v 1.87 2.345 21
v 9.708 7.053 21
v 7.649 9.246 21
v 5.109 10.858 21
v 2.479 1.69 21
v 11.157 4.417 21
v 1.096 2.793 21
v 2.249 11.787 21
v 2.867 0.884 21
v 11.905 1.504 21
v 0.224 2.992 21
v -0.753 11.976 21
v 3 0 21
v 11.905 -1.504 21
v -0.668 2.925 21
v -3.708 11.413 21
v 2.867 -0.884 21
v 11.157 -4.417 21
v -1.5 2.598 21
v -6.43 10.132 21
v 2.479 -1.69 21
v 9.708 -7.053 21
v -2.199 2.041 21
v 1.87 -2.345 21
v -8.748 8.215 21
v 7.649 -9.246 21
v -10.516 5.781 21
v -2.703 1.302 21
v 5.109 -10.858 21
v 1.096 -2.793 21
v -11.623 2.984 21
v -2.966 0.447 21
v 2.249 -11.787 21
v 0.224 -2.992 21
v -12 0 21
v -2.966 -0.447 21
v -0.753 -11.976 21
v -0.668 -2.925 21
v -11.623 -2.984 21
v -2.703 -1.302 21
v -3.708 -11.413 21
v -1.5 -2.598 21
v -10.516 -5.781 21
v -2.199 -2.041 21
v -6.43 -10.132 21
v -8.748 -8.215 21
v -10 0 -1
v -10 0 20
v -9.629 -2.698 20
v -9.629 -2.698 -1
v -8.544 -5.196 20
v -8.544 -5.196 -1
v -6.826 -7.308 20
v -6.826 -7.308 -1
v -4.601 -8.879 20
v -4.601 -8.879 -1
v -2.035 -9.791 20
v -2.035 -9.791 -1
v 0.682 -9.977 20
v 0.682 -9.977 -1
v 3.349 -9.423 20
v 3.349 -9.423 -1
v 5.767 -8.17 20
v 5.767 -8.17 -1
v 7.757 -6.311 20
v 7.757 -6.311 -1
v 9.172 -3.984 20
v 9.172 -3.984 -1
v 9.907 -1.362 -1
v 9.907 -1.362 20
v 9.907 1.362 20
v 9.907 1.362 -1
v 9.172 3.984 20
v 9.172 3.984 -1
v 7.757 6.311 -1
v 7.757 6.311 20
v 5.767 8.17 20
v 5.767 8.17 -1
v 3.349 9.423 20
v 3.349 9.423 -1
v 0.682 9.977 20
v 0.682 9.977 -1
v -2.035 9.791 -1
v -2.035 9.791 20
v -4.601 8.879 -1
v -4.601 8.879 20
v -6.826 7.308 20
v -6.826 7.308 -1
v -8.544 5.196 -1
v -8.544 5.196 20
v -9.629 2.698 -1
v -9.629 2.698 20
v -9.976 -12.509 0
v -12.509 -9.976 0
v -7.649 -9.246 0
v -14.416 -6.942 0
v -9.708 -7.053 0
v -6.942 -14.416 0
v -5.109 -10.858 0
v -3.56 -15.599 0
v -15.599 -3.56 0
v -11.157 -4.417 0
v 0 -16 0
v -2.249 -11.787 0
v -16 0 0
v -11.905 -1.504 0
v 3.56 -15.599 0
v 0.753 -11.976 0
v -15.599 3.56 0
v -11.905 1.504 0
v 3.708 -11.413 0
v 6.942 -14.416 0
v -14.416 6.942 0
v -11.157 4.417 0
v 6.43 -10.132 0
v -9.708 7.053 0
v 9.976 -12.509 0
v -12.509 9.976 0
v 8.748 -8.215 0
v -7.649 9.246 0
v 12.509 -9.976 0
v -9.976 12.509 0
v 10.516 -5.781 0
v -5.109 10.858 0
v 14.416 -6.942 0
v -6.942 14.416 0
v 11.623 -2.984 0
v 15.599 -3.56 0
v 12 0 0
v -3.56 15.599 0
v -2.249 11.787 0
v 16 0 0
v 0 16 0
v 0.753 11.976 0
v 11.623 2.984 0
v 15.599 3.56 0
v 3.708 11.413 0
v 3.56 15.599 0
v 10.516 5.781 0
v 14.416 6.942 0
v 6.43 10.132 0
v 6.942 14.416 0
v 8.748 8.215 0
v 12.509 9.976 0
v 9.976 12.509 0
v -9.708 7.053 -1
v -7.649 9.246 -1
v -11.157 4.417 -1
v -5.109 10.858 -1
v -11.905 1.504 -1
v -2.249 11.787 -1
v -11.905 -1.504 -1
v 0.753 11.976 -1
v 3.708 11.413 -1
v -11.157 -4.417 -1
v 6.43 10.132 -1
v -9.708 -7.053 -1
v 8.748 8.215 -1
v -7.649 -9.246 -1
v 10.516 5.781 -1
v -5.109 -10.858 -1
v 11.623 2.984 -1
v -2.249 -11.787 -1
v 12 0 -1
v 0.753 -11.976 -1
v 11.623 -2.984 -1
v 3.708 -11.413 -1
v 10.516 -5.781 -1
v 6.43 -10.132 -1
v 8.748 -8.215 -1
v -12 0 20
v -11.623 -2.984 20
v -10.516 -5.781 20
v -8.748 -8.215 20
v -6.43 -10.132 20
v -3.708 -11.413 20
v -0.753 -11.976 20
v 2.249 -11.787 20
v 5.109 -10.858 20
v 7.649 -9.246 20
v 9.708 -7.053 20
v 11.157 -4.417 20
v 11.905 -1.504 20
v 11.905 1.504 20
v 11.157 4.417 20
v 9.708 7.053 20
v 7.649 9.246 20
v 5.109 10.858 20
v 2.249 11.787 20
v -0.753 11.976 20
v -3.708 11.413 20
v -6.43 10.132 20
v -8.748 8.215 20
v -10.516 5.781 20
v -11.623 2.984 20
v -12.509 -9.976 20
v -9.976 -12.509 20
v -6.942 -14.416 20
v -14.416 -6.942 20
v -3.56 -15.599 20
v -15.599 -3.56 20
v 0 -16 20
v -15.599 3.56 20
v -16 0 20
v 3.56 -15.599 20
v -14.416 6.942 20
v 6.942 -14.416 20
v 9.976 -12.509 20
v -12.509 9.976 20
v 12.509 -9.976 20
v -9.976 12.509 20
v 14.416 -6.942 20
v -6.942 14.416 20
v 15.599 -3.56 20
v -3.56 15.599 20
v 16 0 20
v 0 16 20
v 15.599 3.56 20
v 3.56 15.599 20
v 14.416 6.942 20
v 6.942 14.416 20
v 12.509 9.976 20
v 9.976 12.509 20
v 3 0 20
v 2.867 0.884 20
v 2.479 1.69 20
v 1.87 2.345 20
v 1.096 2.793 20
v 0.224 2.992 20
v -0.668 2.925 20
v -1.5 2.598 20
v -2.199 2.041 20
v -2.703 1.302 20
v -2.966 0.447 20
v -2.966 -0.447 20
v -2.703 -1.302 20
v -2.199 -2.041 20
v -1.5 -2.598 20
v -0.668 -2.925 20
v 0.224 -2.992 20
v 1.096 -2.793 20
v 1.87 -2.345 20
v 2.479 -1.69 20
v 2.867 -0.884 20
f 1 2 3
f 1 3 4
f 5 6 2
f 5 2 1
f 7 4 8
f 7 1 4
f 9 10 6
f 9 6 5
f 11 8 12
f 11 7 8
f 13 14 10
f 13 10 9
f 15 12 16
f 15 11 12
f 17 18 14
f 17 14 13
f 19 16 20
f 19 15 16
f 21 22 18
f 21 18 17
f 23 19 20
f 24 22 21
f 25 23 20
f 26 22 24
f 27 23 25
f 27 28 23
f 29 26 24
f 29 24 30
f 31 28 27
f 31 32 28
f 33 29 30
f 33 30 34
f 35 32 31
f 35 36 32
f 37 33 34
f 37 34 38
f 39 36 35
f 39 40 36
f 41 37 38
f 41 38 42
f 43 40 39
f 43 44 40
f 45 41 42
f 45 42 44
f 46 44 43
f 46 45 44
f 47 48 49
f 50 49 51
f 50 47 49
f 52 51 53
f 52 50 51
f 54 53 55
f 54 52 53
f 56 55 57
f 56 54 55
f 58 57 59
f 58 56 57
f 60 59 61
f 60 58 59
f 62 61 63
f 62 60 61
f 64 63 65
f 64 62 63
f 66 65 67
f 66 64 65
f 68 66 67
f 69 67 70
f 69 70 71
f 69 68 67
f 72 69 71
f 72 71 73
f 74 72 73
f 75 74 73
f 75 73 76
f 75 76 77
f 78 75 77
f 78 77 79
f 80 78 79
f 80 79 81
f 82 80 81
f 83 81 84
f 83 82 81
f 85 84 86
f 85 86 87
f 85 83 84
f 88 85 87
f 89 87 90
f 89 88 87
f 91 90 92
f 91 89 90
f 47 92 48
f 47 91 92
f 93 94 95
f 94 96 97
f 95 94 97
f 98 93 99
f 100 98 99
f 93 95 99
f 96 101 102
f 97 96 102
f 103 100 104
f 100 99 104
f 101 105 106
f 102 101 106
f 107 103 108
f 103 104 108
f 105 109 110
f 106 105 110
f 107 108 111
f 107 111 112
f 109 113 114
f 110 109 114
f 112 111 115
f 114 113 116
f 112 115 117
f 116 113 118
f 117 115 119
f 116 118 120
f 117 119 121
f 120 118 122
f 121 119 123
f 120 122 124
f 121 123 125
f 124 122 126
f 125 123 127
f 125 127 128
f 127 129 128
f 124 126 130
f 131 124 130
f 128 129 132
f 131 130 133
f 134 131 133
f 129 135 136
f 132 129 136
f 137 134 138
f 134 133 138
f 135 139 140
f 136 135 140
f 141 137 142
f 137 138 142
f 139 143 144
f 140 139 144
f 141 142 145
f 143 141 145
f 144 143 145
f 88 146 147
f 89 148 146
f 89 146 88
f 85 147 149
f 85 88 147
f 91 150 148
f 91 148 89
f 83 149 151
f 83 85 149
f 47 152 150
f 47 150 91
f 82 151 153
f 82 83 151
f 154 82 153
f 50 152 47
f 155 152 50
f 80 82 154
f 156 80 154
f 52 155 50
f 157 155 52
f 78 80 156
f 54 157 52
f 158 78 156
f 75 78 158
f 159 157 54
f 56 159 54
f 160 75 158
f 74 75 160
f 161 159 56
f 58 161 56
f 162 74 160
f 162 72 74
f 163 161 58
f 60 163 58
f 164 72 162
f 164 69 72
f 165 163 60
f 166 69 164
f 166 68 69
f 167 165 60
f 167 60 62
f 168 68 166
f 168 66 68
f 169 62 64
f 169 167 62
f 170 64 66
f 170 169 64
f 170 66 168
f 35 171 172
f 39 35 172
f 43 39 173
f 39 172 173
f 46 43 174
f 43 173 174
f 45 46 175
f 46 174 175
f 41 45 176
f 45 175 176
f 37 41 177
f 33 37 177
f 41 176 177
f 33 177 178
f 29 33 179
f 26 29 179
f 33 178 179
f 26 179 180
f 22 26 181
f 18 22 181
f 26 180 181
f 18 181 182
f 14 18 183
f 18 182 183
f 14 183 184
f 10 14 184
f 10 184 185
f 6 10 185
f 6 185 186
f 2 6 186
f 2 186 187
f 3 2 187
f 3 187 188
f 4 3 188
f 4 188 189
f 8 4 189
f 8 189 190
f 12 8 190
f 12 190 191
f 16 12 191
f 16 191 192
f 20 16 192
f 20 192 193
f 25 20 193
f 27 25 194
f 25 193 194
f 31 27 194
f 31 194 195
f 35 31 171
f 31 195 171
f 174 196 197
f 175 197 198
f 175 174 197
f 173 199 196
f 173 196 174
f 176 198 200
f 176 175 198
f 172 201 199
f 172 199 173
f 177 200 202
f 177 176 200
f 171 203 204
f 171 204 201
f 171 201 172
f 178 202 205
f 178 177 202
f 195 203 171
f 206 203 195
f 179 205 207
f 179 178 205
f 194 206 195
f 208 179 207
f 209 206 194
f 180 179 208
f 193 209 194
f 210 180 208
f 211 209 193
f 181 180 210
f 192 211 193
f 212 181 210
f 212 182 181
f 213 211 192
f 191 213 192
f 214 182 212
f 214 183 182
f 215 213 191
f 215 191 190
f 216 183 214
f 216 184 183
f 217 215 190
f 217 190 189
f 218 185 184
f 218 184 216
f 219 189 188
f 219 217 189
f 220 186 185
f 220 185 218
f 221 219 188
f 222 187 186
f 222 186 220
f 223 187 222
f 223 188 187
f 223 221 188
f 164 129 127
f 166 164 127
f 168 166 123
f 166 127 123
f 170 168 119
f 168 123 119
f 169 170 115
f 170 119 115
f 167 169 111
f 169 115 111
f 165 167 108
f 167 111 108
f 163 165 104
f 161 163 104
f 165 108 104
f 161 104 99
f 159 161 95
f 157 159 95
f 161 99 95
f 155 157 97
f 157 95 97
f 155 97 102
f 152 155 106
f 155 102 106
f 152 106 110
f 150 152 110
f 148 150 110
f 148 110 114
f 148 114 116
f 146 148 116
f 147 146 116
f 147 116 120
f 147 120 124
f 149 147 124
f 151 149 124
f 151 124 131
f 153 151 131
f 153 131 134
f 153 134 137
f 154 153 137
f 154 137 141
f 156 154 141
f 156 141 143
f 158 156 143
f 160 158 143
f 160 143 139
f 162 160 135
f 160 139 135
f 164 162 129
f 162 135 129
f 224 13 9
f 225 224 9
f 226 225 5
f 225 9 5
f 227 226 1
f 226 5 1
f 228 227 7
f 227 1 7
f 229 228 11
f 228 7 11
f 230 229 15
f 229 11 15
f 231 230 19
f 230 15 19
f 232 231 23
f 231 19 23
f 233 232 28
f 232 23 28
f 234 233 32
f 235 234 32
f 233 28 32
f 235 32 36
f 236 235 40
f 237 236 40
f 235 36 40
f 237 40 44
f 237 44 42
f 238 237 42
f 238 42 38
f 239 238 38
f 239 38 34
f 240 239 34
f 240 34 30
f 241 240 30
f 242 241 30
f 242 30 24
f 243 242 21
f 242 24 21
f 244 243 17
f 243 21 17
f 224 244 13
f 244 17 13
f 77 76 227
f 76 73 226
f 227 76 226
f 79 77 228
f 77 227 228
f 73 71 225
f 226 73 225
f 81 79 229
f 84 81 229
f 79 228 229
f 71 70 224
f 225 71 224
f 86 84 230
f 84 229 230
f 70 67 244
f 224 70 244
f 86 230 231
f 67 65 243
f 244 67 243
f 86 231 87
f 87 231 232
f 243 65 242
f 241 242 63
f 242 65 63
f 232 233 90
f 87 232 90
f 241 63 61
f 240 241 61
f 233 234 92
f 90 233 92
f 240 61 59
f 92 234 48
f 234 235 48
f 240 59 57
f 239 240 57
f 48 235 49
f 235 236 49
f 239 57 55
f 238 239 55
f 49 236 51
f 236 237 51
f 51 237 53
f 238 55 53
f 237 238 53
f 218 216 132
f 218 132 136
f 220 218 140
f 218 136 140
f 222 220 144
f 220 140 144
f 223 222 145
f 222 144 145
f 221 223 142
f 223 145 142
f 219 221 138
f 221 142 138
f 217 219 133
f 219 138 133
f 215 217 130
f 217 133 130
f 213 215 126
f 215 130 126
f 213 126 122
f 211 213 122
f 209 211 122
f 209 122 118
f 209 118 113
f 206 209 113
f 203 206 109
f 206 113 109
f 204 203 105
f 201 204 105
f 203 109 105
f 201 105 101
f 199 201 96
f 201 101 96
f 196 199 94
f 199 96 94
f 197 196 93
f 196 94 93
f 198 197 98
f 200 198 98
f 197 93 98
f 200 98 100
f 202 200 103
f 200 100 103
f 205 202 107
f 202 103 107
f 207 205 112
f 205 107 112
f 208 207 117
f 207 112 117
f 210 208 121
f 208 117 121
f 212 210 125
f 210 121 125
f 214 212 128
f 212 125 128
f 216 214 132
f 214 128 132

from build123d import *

# Parameters (mm, degrees)
ESBO_O1_R                = 16
ESBO_O1_R_2              = 12
RESSALTO_EXTRUS_O1_DEPTH = 20
ESBO_O2_R                = 12
ESBO_O2_R_2              = 10
RESSALTO_EXTRUS_O2_DEPTH = 1
ESBO_O3_R                = 12
ESBO_O3_R_2              = 10
RESSALTO_EXTRUS_O3_DEPTH = 21
ESBO_O4_R                = 10
ESBO_O4_R_2              = 3
RESSALTO_EXTRUS_O4_DEPTH = 1


with BuildPart() as part:
    # Esboço1 → Ressalto-extrusão1 (new body)
    with BuildSketch(Plane.XY):
        Circle(ESBO_O1_R)
        Circle(ESBO_O1_R_2, mode=Mode.SUBTRACT)
    extrude(amount=RESSALTO_EXTRUS_O1_DEPTH)



with BuildPart() as body_2:
    # Esboço2 → Ressalto-extrusão2 (new body)
    with BuildSketch(Plane(origin=(0, 0, 0), x_dir=(-1, 0, 0), z_dir=(0, 0, -1))):
        with Locations(Location((0, 0, 0), (0, 0, 180))):
            Circle(ESBO_O2_R)
        Circle(ESBO_O2_R_2, mode=Mode.SUBTRACT)
    extrude(amount=RESSALTO_EXTRUS_O2_DEPTH)


with BuildPart() as part_1:
    add(part.part)

    add(body_2.part)  # Ressalto-extrusão3 merges body 2
    # Esboço3 → Ressalto-extrusão3 (add)
    with BuildSketch(Plane.XY):
        with Locations(Location((0, 0, 0), (0, 0, 180))):
            Circle(ESBO_O3_R)
        with Locations(Location((0, 0, 0), (0, 0, 180))):
            Circle(ESBO_O3_R_2, mode=Mode.SUBTRACT)
    extrude(amount=RESSALTO_EXTRUS_O3_DEPTH)

    # Esboço4 → Ressalto-extrusão4 (add)
    with BuildSketch(Plane.XY.offset(21)):
        with Locations(Location((0, 0, 0), (0, 0, 180))):
            Circle(ESBO_O4_R)
        Circle(ESBO_O4_R_2, mode=Mode.SUBTRACT)
    extrude(amount=-RESSALTO_EXTRUS_O4_DEPTH)


solid = part_1.part
